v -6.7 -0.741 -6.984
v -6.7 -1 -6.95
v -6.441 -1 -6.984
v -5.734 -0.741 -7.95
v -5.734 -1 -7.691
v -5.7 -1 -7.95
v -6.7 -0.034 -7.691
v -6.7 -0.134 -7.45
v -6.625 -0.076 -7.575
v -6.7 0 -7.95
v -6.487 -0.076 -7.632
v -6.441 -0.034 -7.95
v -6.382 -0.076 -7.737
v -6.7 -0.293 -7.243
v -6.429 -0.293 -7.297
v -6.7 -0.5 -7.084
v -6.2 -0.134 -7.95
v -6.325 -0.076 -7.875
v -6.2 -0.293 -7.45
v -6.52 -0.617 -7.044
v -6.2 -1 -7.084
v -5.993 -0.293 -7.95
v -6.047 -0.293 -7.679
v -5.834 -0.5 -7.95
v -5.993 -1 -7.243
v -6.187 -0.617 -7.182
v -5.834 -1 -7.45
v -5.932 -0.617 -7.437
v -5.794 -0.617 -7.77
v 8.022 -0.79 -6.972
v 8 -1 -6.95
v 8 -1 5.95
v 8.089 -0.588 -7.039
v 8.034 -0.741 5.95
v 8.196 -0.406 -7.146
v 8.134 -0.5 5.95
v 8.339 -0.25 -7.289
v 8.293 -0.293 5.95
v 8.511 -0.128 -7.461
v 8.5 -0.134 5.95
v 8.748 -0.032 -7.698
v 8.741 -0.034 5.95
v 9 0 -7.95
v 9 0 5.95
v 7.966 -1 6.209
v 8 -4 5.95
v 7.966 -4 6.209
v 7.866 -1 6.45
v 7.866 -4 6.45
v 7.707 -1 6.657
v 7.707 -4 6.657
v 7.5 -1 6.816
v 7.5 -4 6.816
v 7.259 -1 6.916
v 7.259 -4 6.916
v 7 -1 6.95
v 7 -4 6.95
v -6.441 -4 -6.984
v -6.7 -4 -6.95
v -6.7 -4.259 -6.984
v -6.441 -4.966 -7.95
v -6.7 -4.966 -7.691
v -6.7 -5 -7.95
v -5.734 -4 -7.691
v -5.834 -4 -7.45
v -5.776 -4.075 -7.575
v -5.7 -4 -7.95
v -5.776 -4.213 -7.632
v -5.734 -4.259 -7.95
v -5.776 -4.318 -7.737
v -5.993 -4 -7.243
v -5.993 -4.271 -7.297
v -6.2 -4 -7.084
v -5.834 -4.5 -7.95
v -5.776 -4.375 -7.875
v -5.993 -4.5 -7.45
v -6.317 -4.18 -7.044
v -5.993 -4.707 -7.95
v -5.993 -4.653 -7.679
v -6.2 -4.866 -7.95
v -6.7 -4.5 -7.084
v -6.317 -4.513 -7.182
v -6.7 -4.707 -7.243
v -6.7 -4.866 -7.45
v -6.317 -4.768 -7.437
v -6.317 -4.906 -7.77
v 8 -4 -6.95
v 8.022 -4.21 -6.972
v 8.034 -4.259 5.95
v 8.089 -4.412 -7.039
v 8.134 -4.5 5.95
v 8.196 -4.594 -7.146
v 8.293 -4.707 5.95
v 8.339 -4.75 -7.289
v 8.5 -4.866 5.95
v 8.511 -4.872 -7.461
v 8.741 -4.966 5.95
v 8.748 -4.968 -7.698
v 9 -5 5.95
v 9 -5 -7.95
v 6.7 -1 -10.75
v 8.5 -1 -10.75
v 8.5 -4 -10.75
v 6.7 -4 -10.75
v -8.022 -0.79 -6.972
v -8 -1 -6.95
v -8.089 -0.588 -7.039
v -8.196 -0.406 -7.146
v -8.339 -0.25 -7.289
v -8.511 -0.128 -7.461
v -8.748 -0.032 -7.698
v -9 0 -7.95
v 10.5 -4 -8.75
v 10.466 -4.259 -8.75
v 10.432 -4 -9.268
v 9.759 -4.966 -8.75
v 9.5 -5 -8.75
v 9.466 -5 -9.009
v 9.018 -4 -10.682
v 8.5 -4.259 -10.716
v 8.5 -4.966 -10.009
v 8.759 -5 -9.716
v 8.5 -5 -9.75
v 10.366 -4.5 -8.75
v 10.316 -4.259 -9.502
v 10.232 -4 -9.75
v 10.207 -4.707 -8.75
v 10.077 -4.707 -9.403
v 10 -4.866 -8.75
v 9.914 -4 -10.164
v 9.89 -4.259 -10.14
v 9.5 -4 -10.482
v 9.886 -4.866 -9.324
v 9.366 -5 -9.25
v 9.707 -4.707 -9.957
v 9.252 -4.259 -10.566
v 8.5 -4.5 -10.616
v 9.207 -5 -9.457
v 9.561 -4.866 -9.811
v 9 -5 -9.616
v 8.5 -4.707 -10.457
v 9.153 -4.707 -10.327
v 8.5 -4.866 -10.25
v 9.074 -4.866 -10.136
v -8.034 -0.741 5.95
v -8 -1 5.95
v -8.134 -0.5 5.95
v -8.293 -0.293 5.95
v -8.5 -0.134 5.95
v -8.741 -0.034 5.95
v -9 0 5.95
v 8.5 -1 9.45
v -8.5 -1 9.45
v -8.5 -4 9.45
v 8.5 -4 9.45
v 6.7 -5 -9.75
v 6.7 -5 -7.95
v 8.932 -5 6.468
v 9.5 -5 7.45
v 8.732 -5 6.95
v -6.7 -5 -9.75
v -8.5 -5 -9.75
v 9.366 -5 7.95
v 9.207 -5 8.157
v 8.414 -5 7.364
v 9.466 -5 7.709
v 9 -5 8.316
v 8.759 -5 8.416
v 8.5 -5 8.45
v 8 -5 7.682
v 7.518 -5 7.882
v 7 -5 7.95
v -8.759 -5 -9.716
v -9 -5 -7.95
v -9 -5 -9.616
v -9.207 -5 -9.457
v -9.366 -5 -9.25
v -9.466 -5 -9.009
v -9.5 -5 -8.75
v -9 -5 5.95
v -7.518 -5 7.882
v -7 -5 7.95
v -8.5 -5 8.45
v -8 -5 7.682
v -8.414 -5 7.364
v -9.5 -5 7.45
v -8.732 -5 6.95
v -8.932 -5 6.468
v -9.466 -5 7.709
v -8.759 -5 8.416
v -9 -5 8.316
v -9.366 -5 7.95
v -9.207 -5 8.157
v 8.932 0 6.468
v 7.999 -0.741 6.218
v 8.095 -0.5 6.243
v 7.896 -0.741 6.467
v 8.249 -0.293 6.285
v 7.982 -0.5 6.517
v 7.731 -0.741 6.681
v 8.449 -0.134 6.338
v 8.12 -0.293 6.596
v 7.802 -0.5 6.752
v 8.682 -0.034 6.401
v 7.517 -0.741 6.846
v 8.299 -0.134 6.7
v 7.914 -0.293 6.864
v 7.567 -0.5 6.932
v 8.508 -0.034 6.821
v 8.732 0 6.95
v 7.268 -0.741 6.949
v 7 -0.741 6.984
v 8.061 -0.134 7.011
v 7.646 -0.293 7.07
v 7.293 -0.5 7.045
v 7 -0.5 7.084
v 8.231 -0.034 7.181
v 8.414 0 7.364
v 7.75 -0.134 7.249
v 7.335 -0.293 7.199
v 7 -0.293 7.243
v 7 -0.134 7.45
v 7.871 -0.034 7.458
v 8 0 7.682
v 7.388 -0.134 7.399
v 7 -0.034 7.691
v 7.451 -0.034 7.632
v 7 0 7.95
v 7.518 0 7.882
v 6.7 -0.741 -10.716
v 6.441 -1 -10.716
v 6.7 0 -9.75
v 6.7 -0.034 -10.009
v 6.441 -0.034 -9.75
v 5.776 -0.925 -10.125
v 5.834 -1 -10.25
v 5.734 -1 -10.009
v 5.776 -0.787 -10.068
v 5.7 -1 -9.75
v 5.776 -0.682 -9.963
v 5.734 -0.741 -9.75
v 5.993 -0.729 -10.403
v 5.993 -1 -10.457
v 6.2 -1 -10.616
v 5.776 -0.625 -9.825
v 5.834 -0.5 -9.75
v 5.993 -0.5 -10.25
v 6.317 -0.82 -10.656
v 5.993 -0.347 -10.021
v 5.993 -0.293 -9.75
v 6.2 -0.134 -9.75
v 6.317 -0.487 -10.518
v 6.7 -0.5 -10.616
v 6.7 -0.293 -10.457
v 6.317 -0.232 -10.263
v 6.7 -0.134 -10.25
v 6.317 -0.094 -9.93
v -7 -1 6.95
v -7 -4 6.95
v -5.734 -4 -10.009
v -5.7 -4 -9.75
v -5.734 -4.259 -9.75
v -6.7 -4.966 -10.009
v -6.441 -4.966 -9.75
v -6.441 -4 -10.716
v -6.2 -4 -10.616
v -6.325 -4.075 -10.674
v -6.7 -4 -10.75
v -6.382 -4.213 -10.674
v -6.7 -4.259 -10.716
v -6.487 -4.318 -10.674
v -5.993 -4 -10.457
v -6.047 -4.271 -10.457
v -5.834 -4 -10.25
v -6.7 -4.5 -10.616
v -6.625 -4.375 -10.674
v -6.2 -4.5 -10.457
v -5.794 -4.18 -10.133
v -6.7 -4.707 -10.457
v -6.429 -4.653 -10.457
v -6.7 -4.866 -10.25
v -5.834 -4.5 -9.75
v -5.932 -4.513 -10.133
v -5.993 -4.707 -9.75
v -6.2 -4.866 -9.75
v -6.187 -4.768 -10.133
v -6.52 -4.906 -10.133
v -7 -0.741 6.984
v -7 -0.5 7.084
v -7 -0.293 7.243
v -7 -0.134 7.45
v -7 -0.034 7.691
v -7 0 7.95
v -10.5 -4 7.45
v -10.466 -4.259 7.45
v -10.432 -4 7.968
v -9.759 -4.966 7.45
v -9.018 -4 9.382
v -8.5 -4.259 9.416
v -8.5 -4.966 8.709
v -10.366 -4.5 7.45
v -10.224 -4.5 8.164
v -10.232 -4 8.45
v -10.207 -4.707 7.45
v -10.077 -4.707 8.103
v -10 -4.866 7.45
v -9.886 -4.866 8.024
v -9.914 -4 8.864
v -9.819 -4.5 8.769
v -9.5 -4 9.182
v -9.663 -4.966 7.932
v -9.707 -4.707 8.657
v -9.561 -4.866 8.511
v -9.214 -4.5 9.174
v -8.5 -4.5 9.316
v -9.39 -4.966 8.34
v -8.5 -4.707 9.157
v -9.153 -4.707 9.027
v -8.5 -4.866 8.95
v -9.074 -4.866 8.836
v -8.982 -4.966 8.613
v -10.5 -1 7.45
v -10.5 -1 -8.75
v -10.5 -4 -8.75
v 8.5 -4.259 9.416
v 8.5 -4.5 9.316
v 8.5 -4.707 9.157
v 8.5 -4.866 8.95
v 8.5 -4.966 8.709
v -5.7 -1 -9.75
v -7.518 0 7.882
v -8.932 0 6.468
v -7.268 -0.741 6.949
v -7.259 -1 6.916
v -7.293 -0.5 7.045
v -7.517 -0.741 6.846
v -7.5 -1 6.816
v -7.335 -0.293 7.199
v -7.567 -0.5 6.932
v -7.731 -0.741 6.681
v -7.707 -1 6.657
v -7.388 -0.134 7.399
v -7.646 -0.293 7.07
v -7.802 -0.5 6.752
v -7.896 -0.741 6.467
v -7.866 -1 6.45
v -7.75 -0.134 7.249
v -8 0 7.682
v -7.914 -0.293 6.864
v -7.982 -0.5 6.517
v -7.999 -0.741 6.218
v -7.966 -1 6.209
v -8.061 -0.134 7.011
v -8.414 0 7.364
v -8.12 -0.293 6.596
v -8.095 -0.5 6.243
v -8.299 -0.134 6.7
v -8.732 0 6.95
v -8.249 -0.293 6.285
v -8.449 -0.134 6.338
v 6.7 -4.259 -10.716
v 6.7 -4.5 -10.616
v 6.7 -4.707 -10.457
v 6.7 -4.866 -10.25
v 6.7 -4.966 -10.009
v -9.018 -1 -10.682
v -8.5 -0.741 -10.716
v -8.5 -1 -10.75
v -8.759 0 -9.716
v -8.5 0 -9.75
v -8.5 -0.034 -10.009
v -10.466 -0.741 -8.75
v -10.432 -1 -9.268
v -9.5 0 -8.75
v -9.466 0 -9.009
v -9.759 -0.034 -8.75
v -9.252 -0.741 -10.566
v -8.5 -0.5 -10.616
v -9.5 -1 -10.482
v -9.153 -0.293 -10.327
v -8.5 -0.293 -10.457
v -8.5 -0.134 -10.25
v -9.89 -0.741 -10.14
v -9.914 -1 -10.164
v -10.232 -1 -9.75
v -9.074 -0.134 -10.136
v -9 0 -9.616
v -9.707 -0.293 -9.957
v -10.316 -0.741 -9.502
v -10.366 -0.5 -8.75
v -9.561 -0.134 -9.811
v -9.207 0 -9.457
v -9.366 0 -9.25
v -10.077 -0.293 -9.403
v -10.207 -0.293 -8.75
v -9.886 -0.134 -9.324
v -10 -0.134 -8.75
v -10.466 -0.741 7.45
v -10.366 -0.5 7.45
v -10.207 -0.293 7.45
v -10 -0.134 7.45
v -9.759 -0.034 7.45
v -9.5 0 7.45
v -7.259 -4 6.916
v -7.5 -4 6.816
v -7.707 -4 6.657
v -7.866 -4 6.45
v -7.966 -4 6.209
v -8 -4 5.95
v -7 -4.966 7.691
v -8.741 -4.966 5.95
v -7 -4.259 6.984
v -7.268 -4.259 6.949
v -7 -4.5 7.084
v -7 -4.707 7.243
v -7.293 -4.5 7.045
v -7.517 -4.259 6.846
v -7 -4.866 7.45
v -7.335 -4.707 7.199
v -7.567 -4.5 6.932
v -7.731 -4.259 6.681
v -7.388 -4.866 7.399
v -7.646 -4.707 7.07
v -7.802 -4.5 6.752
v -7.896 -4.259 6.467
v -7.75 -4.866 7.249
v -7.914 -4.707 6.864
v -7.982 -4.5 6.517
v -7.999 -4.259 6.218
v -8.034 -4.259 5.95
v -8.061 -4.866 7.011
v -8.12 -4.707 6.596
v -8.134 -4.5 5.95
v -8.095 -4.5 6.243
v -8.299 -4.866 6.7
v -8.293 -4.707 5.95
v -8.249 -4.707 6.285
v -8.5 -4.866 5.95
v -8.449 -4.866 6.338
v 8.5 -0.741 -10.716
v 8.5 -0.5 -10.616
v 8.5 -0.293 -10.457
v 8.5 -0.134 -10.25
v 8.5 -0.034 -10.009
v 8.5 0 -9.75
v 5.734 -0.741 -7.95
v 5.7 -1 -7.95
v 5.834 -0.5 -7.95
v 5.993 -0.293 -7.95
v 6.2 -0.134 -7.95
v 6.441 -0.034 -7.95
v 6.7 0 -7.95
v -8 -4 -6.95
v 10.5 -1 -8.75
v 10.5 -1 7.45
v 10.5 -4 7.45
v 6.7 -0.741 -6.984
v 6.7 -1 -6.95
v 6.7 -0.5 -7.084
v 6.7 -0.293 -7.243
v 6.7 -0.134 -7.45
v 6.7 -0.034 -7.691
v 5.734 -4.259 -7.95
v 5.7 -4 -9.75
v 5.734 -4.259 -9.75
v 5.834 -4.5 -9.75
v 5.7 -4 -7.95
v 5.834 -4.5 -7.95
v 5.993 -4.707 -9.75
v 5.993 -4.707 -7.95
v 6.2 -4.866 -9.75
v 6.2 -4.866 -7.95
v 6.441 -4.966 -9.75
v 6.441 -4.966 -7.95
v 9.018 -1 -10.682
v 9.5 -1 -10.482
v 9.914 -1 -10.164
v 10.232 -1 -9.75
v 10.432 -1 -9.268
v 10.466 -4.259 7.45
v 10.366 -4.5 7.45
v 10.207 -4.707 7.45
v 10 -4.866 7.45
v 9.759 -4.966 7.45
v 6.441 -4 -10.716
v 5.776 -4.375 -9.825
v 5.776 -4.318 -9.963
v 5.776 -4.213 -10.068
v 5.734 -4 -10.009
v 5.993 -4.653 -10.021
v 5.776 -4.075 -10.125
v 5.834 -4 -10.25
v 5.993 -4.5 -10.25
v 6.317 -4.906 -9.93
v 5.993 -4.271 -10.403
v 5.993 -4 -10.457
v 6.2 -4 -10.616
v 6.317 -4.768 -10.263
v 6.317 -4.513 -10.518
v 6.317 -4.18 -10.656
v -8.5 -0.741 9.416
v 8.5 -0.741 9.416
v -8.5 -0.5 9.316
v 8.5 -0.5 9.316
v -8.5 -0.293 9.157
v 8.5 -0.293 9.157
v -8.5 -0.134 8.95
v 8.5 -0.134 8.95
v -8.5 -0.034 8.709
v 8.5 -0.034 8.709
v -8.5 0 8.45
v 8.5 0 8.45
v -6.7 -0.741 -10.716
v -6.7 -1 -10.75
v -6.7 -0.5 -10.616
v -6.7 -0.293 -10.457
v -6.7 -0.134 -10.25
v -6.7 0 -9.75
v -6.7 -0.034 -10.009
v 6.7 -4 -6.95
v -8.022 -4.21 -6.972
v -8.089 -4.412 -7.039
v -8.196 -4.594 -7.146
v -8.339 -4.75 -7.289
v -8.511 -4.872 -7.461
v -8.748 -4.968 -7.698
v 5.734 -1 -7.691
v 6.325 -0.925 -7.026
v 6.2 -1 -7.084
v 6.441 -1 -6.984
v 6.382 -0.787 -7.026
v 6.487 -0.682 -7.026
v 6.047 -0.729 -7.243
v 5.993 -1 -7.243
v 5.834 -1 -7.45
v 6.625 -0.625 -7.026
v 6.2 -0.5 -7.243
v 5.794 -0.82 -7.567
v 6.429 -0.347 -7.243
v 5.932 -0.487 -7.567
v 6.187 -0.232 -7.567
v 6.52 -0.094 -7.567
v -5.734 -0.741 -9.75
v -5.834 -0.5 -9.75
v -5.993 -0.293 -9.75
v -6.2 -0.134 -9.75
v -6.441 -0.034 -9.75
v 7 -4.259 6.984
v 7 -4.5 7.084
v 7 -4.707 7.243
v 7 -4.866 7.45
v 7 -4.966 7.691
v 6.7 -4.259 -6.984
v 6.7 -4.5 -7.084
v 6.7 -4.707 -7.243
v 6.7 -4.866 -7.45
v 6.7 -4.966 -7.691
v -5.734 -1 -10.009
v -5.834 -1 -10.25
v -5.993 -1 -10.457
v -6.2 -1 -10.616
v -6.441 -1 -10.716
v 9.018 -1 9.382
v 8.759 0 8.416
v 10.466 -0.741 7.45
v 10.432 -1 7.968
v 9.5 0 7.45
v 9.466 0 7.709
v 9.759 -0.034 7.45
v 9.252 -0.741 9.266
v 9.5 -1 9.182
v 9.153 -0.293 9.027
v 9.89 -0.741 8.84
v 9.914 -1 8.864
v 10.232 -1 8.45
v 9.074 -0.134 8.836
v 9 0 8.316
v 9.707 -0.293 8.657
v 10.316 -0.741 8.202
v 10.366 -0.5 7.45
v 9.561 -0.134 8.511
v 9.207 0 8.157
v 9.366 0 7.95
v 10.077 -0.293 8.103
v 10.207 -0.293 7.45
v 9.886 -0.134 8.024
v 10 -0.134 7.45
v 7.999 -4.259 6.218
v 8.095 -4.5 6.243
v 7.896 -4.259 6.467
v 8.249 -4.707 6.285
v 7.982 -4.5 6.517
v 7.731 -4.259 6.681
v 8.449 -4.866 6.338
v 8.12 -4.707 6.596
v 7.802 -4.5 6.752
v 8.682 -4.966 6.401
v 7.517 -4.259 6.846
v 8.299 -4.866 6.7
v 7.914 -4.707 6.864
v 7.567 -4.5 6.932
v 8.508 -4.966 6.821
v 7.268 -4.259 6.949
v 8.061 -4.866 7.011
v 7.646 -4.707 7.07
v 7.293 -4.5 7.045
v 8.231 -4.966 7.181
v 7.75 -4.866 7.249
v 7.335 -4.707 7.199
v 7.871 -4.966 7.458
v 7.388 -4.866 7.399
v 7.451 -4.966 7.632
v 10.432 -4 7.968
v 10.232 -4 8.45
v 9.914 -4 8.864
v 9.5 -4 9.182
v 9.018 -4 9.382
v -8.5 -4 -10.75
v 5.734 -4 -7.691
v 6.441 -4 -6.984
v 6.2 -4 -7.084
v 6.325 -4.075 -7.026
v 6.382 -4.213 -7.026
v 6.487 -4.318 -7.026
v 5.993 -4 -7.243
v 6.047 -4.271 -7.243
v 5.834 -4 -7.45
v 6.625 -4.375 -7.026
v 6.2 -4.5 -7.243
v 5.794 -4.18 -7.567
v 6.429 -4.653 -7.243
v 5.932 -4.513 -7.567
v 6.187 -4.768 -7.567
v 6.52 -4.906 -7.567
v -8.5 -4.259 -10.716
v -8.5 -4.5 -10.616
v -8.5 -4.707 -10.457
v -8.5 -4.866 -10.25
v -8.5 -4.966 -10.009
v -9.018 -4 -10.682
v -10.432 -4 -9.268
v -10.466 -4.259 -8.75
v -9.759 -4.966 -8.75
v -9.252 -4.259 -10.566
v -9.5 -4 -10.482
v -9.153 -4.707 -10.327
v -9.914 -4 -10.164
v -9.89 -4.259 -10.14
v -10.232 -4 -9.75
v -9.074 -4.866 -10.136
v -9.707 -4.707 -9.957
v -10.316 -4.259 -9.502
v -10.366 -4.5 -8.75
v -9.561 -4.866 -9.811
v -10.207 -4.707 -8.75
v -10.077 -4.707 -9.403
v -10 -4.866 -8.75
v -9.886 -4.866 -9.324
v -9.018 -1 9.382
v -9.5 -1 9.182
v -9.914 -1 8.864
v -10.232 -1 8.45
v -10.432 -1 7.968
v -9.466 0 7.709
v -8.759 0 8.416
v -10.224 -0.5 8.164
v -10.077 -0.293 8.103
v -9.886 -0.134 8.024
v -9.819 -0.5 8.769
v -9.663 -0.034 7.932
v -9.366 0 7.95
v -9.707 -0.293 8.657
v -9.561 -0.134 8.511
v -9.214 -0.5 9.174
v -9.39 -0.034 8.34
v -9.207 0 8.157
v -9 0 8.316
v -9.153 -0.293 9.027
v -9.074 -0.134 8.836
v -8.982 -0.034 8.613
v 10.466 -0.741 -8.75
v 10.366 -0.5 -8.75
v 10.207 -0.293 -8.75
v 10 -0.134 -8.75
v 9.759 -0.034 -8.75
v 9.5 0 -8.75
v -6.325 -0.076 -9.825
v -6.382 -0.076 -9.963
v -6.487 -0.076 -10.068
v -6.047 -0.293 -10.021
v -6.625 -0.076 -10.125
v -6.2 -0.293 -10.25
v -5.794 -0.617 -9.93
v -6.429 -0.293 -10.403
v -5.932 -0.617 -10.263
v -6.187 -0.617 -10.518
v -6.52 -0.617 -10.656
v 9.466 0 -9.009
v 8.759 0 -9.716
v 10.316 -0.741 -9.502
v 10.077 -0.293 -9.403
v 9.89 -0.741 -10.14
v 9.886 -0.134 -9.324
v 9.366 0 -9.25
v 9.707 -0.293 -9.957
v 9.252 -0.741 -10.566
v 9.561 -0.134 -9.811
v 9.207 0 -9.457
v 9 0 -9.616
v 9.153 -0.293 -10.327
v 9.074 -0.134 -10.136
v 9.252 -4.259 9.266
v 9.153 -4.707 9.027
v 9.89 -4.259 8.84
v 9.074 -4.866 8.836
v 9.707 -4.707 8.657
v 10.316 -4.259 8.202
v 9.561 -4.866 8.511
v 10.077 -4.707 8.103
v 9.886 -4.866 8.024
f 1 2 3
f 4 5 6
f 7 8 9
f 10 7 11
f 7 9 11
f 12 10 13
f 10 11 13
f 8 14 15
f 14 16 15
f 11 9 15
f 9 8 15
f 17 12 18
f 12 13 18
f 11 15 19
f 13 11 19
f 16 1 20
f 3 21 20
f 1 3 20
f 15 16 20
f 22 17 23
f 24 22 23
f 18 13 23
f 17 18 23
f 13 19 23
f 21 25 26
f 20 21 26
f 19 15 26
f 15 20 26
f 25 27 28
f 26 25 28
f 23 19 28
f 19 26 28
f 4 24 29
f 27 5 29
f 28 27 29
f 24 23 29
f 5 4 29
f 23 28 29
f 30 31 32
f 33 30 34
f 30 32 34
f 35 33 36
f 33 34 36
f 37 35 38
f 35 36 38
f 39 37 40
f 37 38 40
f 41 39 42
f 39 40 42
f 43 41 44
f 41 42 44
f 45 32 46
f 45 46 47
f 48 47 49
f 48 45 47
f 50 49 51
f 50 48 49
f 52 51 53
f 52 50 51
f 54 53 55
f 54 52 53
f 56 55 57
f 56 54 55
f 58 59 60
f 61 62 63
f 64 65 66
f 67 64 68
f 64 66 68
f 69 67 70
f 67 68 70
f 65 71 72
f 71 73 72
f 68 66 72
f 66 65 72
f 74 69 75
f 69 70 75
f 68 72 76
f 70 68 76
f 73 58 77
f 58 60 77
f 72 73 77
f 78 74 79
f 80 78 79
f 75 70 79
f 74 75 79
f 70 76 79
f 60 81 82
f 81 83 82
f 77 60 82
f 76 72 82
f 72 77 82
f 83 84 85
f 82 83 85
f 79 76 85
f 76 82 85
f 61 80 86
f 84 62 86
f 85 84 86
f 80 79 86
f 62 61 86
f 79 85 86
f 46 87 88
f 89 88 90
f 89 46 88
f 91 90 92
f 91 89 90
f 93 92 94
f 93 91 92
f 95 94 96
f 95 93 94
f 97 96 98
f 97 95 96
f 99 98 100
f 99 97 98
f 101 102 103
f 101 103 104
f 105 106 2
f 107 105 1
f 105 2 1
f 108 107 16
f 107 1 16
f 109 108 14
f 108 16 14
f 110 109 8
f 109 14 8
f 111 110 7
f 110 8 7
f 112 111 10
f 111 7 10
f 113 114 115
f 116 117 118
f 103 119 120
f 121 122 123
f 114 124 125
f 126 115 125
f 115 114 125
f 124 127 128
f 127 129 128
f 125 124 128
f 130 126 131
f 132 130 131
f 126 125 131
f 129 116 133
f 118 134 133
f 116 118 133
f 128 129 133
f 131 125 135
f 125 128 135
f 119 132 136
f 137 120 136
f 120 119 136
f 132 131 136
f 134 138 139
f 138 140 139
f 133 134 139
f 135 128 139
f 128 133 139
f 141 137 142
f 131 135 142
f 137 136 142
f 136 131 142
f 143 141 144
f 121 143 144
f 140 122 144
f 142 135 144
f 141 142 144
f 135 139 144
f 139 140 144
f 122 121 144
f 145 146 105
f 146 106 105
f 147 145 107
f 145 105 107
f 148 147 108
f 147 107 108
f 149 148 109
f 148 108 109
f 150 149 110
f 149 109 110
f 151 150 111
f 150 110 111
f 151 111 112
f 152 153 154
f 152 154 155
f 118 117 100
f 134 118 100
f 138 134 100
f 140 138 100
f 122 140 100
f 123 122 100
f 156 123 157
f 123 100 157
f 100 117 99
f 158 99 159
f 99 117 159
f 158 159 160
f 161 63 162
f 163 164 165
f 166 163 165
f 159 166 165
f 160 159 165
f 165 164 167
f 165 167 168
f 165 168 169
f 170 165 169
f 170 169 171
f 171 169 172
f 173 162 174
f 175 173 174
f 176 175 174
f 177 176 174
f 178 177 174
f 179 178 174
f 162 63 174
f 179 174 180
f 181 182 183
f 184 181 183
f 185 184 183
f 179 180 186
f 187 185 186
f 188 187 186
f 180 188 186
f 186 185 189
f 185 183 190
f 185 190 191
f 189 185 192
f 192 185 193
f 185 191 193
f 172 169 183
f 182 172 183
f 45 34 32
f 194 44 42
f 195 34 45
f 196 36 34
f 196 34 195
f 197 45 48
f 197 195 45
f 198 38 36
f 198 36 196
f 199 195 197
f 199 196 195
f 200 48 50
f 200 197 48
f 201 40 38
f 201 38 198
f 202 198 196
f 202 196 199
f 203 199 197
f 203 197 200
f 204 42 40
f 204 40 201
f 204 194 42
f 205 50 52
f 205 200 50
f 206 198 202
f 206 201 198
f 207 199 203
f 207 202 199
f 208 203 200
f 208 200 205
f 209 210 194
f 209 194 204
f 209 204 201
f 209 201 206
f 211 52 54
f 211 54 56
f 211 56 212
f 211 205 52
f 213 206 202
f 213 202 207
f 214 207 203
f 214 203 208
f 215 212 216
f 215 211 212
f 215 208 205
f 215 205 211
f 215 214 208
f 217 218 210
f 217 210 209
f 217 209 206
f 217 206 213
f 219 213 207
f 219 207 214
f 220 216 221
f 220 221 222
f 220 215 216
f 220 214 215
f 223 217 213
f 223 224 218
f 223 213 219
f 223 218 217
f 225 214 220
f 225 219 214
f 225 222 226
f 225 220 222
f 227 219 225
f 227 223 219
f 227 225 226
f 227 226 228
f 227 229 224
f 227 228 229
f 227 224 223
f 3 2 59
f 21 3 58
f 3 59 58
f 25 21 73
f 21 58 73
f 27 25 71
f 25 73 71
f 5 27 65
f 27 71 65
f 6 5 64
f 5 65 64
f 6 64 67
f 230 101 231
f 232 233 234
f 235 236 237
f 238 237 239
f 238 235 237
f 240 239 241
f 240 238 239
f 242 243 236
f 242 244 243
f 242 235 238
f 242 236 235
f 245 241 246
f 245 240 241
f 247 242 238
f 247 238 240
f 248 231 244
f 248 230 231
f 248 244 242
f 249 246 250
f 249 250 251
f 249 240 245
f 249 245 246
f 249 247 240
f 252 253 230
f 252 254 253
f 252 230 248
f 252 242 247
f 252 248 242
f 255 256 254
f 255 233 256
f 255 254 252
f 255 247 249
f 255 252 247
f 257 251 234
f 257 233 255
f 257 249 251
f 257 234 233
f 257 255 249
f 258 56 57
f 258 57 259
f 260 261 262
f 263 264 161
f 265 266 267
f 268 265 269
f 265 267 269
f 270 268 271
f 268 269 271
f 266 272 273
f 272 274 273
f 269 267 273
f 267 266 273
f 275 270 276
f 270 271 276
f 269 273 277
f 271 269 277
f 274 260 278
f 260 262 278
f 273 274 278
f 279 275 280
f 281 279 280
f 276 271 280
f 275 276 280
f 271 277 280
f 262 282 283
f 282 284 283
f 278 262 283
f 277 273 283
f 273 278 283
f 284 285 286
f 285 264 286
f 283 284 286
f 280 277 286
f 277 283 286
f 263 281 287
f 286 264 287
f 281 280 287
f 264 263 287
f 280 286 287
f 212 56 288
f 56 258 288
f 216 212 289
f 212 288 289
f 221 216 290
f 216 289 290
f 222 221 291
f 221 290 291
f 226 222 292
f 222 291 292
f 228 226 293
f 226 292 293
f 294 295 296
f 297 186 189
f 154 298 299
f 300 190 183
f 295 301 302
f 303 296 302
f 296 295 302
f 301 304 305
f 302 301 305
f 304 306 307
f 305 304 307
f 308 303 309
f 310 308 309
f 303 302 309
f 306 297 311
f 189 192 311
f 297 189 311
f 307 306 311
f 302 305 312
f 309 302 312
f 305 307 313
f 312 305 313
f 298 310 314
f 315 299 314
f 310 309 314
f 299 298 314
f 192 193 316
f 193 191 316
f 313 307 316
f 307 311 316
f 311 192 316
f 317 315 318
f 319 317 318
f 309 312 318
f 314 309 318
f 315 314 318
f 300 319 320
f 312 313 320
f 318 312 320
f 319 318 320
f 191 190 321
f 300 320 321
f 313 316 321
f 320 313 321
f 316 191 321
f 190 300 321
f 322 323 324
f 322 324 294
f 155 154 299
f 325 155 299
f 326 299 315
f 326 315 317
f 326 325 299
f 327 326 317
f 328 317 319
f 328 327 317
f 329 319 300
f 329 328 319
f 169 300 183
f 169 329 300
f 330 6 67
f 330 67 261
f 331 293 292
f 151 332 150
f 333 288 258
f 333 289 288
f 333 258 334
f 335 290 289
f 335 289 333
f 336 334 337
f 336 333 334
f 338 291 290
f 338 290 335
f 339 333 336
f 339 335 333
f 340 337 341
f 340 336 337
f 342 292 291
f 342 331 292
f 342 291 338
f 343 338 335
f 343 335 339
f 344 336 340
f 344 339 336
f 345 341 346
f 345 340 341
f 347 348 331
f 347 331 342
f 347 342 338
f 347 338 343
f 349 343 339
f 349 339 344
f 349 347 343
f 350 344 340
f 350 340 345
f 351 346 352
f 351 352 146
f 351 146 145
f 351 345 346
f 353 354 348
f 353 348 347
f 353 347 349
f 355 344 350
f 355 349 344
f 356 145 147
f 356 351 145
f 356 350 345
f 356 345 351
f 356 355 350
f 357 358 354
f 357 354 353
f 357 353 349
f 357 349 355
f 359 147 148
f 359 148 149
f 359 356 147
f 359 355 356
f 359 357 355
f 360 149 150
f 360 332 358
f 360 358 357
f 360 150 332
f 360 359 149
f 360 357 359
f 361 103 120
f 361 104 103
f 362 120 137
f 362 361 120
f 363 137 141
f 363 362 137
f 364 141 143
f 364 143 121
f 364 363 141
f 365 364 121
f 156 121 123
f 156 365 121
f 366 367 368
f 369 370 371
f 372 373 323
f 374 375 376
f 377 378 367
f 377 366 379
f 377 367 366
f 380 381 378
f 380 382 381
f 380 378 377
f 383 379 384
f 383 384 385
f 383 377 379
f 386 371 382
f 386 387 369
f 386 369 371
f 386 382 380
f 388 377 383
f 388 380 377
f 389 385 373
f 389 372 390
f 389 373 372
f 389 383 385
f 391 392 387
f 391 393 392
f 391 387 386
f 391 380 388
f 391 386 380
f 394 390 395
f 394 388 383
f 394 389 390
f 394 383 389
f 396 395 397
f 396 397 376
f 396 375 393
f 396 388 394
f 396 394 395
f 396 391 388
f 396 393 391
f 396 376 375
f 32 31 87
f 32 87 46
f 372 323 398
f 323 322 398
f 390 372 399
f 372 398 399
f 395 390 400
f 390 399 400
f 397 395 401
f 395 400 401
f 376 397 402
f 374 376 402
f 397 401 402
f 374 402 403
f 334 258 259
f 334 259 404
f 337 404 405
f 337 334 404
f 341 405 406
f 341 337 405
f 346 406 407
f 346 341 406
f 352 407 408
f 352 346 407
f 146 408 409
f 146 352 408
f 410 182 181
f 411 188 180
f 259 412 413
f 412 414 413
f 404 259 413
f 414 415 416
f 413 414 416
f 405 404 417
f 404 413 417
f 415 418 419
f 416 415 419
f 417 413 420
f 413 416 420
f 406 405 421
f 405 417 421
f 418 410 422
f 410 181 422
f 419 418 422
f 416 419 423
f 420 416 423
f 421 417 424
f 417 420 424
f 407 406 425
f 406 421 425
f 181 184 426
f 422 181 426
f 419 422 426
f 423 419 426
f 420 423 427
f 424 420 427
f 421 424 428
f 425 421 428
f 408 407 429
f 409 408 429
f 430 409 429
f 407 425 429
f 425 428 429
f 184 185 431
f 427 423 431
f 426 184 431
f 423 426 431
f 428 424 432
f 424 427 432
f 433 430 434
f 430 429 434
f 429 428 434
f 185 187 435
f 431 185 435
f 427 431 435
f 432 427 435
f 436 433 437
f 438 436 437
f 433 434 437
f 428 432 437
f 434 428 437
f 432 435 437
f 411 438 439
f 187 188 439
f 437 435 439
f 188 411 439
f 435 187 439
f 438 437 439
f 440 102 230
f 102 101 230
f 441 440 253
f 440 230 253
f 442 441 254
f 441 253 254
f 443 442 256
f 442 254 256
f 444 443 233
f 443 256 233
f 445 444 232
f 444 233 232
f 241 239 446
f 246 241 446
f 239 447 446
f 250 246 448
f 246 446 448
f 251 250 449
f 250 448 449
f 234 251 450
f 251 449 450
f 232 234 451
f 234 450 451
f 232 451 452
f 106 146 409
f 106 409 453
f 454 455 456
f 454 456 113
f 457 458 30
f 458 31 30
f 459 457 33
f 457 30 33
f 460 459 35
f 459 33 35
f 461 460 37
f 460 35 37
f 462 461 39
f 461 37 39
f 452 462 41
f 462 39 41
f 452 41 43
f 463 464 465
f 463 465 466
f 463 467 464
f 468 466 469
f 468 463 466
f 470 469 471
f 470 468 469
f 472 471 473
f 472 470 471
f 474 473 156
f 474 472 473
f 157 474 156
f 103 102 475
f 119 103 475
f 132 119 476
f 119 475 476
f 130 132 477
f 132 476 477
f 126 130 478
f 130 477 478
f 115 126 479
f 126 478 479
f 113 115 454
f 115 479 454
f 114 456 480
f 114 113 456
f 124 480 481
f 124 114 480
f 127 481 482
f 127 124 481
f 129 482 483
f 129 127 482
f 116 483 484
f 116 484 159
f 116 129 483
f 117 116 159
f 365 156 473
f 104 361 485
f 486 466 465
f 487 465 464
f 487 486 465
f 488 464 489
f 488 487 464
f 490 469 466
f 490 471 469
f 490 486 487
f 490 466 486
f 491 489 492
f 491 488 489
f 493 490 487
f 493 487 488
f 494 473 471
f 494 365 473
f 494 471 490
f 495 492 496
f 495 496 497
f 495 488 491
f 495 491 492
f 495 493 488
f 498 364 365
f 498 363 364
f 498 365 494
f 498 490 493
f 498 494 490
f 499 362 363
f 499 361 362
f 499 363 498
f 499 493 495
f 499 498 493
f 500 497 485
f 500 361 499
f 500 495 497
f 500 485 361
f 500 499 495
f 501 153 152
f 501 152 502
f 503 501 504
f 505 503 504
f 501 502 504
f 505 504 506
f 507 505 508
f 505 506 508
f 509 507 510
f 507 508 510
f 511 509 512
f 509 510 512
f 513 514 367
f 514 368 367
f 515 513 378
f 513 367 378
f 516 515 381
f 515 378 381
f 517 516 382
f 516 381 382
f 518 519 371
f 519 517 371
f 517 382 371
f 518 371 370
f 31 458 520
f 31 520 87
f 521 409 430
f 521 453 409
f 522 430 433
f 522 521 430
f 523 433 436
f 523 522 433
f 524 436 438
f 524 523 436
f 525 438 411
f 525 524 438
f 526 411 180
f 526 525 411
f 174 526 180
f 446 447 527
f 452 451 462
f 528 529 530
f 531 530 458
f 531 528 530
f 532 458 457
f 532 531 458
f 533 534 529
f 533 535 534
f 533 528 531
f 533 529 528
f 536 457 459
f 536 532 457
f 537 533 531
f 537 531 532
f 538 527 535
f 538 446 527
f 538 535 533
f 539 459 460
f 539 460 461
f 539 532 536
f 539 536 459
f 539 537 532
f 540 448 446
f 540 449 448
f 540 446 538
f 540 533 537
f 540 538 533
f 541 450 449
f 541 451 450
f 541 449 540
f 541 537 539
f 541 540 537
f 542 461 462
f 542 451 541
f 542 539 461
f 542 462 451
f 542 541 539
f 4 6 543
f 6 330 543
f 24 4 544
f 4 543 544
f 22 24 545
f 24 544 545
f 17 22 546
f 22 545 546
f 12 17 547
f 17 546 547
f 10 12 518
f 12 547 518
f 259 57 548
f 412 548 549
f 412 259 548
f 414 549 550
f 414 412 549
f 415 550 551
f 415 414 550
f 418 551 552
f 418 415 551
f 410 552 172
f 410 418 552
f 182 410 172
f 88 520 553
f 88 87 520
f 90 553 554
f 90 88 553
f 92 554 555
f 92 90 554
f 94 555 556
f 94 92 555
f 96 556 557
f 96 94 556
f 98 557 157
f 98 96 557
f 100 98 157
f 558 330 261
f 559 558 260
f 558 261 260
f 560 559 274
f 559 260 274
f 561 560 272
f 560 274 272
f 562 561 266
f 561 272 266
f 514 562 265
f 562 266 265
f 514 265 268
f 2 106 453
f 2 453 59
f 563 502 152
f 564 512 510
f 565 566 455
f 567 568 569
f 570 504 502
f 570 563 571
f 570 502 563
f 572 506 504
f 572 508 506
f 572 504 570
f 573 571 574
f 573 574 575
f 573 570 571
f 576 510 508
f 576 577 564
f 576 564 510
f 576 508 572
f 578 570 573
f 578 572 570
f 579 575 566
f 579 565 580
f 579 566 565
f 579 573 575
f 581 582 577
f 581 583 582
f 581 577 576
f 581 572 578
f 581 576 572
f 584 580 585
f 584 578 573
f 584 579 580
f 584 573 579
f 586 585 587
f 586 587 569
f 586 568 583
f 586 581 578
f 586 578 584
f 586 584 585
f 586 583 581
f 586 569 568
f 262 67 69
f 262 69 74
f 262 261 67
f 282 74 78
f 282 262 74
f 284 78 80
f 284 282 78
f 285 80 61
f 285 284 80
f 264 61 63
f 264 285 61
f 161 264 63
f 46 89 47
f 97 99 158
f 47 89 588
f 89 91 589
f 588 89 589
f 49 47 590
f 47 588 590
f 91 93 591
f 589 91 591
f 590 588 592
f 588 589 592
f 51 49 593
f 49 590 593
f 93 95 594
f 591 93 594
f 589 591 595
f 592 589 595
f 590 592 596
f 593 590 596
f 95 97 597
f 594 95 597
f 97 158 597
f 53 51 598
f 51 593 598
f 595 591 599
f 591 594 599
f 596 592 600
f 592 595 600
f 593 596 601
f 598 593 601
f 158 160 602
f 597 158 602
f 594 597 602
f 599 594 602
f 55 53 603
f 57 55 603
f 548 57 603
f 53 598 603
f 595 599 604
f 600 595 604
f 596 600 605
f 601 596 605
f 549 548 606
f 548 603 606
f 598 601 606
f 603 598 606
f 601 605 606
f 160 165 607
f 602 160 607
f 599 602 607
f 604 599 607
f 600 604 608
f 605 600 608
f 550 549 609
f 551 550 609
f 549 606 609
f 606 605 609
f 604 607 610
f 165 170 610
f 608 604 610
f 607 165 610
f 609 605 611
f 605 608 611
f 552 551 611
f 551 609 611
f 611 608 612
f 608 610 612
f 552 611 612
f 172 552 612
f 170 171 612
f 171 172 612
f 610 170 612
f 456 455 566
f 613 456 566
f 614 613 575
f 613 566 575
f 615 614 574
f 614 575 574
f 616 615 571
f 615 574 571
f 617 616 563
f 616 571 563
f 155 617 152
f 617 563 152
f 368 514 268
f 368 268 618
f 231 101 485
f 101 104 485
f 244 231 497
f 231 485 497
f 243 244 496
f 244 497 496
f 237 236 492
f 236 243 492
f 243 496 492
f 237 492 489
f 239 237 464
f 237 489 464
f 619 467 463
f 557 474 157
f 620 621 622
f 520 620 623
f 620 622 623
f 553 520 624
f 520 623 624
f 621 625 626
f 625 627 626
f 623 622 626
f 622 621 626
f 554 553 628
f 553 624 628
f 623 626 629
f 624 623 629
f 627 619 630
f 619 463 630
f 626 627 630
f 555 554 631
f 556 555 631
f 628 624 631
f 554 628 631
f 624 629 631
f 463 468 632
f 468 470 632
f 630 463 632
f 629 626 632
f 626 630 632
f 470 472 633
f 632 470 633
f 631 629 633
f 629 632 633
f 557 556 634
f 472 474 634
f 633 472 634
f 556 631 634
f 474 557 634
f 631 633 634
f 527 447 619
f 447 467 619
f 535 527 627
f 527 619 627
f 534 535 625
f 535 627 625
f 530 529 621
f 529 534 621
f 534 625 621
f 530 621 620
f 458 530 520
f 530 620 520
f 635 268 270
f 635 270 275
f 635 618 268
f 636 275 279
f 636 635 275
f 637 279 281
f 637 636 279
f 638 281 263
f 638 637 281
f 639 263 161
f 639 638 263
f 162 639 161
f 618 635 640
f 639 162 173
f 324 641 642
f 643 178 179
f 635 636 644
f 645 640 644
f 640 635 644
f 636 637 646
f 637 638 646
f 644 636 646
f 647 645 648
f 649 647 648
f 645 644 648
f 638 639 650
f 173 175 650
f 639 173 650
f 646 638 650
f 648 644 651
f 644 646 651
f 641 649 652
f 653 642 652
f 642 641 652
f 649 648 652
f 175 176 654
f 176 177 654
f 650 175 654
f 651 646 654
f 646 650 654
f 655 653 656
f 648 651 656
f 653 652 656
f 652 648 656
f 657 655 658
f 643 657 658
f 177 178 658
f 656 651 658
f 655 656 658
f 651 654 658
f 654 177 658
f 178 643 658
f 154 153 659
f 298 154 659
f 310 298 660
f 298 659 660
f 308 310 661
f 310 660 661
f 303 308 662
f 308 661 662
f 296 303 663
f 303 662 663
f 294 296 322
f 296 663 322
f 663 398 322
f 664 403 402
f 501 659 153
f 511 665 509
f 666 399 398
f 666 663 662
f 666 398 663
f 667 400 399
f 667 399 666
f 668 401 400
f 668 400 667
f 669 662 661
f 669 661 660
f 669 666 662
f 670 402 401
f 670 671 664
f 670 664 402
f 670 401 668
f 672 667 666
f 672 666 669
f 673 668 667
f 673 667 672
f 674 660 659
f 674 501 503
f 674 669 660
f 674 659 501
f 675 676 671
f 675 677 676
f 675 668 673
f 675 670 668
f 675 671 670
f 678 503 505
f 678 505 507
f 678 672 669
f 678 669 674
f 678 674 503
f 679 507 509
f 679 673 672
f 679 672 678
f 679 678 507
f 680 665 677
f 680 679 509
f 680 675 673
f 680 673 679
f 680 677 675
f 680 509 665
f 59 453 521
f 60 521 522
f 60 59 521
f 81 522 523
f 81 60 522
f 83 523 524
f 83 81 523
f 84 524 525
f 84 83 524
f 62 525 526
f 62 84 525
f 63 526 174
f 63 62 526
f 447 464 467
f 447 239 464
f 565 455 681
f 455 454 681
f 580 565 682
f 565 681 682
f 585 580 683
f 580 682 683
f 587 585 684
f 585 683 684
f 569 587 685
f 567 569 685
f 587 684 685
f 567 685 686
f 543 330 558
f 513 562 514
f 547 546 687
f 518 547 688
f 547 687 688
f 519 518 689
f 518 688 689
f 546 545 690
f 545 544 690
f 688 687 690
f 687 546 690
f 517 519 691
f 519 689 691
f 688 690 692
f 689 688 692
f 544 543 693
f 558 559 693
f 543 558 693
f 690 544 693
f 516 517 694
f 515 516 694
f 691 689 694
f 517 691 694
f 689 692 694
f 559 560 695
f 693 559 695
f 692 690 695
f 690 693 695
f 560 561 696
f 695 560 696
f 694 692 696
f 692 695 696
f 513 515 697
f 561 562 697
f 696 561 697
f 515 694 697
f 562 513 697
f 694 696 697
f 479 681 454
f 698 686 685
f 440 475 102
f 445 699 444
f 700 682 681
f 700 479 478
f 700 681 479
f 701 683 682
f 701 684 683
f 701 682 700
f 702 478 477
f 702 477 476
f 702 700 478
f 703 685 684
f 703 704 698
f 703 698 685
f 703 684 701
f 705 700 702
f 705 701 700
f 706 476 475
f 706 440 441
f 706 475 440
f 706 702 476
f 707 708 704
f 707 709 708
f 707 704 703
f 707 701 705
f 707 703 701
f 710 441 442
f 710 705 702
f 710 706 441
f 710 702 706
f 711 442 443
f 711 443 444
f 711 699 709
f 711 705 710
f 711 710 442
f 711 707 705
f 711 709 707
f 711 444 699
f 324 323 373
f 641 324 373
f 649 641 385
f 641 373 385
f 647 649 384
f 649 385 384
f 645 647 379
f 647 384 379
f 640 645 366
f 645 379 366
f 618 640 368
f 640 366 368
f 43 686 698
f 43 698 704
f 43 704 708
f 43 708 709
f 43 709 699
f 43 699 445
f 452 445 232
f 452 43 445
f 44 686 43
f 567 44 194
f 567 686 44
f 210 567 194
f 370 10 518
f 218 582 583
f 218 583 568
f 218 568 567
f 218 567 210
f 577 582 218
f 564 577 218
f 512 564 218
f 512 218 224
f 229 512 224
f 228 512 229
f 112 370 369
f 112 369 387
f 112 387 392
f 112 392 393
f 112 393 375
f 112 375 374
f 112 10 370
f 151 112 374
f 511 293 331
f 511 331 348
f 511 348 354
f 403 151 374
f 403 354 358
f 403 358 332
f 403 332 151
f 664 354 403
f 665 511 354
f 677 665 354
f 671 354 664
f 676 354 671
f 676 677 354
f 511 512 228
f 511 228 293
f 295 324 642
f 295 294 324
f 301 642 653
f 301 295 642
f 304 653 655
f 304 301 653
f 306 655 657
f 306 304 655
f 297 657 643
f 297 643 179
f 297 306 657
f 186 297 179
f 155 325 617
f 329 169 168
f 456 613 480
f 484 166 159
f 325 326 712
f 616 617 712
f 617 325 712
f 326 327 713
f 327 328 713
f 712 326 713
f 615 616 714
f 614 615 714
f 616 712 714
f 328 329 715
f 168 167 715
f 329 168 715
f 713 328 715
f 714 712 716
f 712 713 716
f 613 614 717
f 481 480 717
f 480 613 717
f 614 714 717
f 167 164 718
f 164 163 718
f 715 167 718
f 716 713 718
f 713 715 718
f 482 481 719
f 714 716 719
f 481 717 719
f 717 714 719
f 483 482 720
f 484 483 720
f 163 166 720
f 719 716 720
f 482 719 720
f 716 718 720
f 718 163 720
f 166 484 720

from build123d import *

# Parameters (mm, degrees)
PAD_DEPTH = 5
FILLET_R  = 1


with BuildPart() as part:
    # Sketch → Pad (new body)
    with BuildSketch(Plane.XZ):
        with BuildLine():
            Line((-8, 5.95), (-8, -6.95))
            Line((-8, -6.95), (-5.7, -6.95))
            Line((-5.7, -6.95), (-5.7, -10.75))
            Line((-5.7, -10.75), (-8.5, -10.75))
            ThreePointArc((-10.5, -8.75), (-9.914214, -10.164214), (-8.5, -10.75))
            Line((-10.5, -8.75), (-10.5, 7.45))
            ThreePointArc((-8.5, 9.45), (-9.914214, 8.864214), (-10.5, 7.45))
            Line((-8.5, 9.45), (8.5, 9.45))
            ThreePointArc((10.5, 7.45), (9.914214, 8.864214), (8.5, 9.45))
            Line((10.5, 7.45), (10.5, -8.75))
            ThreePointArc((8.5, -10.75), (9.914214, -10.164214), (10.5, -8.75))
            Line((8.5, -10.75), (5.7, -10.75))
            Line((5.7, -10.75), (5.7, -6.95))
            Line((5.7, -6.95), (8, -6.95))
            Line((8, -6.95), (8, 5.95))
            ThreePointArc((8, 5.95), (7.707107, 6.657107), (7, 6.95))
            Line((7, 6.95), (-7, 6.95))
            ThreePointArc((-7, 6.95), (-7.707107, 6.657107), (-8, 5.95))
        make_face()
    extrude(amount=PAD_DEPTH)

    # Fillet
    fillet_edges = [part.edges().sort_by_distance(p)[0] for p in [
        (-6.85, -5, -6.95),
        (-8, -5, -0.5),
        (-5.7, -2.5, -6.95),
        (-5.7, -5, -8.85),
        (-5.7, -2.5, -10.75),
        (-10.5, -5, -0.65),
        (-8, 0, -0.5),
        (-6.85, 0, -6.95),
        (-5.7, 0, -8.85),
        (0, 0, 9.45),
        (5.7, -5, -8.85),
        (5.7, -2.5, -10.75),
        (5.7, 0, -8.85),
        (5.7, -2.5, -6.95),
        (6.85, -5, -6.95),
        (7.1, -5, -10.75),
        (10.5, -5, -0.65),
        (8, -5, -0.5),
        (8, 0, -0.5),
        (-10.5, 0, -0.65),
        (0, -5, 9.45),
        (10.5, 0, -0.65),
        (6.85, 0, -6.95),
    ]]
    fillet(fillet_edges, radius=FILLET_R)


solid = part.part
